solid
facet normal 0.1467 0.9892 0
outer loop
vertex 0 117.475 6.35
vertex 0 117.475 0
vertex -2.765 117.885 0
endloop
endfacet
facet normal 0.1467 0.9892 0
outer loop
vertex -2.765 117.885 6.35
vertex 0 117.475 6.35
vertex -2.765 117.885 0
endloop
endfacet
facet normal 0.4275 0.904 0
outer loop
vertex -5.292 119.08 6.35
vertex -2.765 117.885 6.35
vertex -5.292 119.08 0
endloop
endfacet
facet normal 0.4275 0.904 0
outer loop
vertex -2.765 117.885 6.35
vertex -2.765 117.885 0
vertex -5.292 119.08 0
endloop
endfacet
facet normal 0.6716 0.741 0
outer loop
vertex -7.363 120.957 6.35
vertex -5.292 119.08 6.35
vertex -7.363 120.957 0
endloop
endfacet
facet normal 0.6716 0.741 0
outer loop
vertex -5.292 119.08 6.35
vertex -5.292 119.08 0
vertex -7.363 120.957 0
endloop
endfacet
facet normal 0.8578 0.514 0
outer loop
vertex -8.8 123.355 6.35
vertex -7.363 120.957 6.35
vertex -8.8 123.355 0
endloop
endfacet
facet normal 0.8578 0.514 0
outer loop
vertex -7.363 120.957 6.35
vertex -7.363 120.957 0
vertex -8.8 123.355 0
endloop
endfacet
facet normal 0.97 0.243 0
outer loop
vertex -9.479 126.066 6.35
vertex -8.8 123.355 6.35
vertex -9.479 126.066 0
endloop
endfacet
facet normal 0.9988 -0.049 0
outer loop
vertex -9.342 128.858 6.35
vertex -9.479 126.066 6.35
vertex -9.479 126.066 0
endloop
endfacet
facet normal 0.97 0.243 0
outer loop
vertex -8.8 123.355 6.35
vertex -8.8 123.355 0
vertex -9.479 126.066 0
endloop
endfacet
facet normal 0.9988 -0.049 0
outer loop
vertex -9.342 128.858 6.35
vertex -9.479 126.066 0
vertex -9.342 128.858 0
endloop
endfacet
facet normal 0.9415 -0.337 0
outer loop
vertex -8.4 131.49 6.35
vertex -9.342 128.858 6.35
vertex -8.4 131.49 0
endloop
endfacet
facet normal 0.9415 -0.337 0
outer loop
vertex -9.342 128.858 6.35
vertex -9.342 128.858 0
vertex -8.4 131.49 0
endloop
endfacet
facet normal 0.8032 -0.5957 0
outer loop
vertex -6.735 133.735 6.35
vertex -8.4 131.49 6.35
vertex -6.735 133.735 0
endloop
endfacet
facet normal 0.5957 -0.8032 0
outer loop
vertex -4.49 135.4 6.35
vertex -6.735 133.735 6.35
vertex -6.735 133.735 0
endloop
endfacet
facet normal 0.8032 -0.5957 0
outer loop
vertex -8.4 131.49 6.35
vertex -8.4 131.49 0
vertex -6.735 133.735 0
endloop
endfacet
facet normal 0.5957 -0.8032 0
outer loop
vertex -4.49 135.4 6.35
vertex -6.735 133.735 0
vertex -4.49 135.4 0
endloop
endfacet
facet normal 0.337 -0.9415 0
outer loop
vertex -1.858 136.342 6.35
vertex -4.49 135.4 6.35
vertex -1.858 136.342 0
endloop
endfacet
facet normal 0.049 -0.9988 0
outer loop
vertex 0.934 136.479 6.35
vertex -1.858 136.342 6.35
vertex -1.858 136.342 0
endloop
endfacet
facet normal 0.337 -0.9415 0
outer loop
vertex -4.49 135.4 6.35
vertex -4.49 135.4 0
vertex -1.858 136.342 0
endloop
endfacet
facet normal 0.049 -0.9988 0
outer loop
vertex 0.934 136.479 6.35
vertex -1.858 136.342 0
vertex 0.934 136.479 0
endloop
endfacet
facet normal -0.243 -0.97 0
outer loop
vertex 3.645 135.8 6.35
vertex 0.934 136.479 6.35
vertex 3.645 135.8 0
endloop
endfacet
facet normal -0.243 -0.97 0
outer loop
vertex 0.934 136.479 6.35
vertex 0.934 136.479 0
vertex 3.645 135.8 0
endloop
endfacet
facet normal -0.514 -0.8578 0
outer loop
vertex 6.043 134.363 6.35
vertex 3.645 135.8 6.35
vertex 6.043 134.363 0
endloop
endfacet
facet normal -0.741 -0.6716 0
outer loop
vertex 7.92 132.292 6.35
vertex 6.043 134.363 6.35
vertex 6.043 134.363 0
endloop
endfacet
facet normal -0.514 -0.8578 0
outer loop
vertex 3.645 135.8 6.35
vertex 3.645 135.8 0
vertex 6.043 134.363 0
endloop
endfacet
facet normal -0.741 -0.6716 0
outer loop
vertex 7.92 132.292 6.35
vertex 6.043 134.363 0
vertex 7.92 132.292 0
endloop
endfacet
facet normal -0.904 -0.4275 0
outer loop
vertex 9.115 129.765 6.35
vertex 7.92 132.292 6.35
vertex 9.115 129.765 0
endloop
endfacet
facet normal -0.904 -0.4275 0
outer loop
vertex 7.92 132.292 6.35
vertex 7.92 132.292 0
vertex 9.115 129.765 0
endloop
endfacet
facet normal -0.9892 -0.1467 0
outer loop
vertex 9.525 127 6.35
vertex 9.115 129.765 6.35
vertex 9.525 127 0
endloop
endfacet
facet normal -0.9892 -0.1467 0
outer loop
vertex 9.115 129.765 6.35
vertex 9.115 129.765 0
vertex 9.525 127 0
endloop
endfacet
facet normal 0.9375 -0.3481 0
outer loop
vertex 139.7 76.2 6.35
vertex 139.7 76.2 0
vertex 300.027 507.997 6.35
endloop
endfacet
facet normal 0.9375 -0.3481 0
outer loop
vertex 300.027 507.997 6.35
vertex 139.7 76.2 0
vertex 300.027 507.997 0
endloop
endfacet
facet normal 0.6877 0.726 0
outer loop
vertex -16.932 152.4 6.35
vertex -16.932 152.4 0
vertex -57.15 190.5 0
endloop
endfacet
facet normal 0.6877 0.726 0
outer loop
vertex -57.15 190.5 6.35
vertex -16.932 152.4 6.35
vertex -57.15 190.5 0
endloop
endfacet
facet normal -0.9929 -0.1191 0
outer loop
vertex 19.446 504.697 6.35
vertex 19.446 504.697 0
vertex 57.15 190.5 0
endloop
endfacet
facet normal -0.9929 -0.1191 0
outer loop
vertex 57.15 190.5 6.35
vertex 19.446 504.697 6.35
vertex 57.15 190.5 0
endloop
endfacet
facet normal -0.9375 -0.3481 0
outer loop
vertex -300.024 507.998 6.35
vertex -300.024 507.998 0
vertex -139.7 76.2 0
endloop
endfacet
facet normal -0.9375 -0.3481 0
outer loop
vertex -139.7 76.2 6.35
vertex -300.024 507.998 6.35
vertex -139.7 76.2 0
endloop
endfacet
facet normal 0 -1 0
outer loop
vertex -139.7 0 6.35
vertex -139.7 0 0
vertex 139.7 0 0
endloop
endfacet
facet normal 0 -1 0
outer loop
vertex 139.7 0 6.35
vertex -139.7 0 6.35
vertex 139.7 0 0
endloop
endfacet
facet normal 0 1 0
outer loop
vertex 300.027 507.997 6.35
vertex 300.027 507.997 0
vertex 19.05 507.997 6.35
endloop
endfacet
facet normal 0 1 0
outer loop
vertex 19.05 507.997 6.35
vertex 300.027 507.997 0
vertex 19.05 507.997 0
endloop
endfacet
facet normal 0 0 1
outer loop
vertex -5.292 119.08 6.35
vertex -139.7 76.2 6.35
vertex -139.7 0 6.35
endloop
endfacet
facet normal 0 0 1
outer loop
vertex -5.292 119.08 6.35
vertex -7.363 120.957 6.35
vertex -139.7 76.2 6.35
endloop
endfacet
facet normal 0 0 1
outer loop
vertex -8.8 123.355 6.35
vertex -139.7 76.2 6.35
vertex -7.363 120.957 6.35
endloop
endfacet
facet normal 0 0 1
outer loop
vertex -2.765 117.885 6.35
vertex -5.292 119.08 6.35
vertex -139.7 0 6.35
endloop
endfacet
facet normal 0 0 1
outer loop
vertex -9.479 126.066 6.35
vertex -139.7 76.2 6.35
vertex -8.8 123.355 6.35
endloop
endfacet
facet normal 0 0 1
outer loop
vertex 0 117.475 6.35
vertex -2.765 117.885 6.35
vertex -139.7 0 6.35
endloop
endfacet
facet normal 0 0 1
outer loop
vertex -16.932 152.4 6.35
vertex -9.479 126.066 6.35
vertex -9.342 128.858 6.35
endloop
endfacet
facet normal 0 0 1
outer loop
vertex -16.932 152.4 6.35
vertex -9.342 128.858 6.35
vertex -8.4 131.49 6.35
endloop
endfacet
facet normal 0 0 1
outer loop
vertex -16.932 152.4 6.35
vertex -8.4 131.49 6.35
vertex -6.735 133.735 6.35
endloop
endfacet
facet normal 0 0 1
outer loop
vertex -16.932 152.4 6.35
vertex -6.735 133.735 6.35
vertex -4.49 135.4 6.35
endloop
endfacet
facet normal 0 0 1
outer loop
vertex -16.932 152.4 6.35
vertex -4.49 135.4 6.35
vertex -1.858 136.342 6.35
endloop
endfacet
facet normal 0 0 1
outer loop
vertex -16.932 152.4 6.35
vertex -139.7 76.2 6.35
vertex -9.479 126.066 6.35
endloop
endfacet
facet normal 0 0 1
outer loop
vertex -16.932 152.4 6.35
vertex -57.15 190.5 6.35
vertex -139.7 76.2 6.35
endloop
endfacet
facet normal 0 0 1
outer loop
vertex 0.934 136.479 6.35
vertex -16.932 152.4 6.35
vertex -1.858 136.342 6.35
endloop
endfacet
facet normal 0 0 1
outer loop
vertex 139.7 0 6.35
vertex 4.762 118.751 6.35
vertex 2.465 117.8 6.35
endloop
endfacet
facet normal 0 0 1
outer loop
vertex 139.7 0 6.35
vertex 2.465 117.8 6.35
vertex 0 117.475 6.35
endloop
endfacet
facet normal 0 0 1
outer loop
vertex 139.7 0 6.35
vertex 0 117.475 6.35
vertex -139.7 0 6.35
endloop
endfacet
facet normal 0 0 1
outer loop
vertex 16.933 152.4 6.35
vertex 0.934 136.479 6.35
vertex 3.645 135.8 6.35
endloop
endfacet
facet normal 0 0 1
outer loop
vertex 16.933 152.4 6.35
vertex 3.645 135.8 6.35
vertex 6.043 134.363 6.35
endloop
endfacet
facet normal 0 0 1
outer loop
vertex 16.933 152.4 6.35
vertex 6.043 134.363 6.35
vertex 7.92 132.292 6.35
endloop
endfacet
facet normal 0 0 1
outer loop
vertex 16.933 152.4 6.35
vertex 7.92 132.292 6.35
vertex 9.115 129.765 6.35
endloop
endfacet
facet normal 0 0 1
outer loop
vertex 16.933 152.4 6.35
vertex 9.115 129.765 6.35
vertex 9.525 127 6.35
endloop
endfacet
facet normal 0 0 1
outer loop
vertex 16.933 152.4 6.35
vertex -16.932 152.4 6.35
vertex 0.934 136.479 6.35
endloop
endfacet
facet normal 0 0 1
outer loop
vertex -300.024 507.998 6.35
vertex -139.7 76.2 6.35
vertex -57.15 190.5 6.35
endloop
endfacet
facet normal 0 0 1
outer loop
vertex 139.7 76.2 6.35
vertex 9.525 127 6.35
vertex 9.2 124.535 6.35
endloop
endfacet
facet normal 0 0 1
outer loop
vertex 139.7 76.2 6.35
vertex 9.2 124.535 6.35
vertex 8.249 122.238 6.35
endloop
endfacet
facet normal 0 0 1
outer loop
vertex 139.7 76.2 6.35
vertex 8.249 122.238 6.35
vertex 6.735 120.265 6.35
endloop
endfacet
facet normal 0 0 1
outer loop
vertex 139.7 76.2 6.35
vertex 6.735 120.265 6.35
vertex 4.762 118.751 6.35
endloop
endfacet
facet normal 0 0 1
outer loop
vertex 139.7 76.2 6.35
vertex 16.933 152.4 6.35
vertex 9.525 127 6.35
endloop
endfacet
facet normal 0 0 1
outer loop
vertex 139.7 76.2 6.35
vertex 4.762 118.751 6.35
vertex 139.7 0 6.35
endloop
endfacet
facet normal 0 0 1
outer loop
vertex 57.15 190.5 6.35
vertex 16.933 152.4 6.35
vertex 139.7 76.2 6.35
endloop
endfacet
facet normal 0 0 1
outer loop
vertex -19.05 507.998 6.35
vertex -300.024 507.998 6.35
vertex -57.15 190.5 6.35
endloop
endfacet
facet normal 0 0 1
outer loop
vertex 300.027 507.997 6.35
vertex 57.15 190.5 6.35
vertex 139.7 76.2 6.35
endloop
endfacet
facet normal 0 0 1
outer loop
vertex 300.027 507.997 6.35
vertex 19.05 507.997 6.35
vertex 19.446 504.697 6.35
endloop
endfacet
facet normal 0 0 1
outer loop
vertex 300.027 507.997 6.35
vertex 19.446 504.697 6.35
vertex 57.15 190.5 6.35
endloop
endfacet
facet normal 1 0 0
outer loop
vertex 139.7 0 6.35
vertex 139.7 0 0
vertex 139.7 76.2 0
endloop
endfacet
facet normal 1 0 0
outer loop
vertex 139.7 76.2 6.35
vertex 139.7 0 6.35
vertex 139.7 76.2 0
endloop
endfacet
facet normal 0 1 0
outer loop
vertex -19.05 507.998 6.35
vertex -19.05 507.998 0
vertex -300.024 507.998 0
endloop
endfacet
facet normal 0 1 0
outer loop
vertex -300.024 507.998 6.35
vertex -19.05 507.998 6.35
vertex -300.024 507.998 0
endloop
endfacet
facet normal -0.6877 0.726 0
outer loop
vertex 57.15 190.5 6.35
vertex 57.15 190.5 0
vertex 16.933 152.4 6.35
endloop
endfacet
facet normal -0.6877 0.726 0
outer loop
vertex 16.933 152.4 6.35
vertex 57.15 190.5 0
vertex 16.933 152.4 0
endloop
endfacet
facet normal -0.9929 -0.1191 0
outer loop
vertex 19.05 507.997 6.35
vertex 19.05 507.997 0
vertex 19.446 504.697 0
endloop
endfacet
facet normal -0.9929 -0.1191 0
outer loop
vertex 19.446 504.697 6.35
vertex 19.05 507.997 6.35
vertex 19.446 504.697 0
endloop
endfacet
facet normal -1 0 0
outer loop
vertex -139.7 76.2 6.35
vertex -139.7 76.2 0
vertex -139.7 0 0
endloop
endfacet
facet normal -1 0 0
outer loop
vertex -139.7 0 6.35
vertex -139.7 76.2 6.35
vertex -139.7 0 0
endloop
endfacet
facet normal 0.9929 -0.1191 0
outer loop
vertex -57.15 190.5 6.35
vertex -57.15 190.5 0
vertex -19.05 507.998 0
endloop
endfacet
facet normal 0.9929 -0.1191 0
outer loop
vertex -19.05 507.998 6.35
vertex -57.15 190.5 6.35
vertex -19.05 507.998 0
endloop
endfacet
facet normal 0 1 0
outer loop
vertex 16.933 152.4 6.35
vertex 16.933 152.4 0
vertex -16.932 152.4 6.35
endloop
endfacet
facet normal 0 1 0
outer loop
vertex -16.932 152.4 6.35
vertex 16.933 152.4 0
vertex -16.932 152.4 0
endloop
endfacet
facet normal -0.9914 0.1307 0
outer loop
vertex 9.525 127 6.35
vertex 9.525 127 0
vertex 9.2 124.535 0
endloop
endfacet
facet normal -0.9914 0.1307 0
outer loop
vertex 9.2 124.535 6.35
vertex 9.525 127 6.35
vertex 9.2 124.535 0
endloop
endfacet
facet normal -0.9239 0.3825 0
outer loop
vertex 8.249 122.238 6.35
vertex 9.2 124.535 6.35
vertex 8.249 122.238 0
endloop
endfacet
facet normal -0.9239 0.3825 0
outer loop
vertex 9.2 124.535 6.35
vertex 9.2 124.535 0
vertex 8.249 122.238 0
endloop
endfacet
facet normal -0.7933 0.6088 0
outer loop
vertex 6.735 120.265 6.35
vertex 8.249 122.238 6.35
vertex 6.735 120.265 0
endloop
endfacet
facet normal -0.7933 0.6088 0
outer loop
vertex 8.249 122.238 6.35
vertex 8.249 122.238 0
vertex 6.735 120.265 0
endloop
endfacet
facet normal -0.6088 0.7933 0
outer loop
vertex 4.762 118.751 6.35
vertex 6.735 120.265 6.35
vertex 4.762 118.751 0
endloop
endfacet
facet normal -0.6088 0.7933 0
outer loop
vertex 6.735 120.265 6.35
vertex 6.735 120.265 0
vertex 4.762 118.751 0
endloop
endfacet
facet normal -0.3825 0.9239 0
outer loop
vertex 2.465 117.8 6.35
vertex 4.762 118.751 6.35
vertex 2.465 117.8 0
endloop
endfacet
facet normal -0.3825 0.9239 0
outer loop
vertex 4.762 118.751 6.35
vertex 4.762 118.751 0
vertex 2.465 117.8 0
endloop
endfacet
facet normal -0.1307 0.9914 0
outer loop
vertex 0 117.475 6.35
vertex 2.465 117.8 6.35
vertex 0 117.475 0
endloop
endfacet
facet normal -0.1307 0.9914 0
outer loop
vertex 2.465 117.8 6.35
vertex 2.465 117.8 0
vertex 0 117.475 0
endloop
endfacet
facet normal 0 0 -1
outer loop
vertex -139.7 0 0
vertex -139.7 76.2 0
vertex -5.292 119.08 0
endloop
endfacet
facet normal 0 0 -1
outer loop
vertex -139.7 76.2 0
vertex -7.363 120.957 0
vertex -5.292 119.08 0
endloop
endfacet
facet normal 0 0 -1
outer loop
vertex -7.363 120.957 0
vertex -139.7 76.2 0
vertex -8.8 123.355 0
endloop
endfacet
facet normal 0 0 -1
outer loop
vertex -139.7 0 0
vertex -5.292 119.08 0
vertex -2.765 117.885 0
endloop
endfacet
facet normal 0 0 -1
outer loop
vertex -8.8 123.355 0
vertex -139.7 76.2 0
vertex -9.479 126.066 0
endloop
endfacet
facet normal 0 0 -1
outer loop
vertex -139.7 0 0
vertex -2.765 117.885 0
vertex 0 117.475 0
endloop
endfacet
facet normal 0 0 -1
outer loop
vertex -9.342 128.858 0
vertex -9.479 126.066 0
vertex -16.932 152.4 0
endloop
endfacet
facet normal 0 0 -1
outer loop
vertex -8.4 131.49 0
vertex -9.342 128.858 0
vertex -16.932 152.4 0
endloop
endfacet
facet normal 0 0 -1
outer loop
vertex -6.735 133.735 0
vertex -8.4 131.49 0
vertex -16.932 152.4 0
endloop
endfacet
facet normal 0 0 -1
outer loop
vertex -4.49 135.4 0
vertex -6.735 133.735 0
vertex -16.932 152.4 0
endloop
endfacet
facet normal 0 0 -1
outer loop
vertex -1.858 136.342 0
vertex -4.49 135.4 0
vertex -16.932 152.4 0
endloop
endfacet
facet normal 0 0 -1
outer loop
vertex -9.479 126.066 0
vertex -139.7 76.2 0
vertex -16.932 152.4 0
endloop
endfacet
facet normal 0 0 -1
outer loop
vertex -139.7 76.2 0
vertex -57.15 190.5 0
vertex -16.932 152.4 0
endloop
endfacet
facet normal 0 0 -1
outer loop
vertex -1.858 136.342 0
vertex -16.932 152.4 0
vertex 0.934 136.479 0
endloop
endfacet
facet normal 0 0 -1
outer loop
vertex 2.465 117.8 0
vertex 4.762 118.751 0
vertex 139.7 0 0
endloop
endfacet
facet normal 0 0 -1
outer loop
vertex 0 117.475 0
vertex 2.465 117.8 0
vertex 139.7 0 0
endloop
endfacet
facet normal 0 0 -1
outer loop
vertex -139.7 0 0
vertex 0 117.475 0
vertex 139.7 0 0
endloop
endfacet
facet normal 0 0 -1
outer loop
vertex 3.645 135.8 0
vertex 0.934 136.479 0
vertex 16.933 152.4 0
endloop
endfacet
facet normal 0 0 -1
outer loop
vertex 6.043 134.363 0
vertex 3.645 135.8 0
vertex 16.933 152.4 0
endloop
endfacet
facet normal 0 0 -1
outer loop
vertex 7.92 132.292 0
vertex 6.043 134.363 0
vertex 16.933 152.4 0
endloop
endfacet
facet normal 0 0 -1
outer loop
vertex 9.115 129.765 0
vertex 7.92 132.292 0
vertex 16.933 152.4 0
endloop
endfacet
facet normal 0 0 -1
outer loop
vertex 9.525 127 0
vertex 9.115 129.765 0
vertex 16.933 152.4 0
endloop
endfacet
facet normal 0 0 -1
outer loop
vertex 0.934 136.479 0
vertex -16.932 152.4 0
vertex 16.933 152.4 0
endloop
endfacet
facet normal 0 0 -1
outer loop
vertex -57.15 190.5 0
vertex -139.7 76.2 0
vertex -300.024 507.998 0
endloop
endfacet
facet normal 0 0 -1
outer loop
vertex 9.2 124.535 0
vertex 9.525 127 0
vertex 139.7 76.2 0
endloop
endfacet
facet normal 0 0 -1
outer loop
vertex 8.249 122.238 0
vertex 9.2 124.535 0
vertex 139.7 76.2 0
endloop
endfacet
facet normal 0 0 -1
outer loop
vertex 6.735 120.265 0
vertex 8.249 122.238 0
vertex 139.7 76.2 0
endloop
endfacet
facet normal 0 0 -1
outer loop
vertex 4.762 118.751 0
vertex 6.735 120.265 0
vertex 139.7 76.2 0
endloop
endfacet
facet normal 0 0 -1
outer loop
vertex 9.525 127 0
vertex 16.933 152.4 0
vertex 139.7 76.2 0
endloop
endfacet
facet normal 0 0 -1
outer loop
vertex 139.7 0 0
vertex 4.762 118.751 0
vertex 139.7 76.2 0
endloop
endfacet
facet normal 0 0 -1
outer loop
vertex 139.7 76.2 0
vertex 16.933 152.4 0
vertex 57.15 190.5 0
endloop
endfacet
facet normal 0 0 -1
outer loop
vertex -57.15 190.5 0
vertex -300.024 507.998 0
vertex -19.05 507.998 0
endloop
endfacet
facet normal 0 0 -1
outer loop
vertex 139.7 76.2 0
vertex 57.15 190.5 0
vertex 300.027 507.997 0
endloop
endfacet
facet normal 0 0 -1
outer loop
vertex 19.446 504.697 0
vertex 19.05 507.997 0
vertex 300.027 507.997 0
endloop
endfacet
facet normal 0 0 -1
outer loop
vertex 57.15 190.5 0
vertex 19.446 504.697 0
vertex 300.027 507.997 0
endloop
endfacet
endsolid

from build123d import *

# Parameters (mm, degrees)
F1_DEPTH = 6.35


with BuildPart() as f1:
    # F0 (on Top) → F1 (new body)
    with BuildSketch(Plane.XY):
        Polygon((-139.7, 0), (0, 0), (139.7, 0), (139.7, 76.2), (300.026565, 507.997021), (19.052757, 507.997021), (19.05, 507.997021), (19.446046, 504.696671), (57.15, 190.5), (16.933333, 152.4), (0, 152.4), (-16.932315, 152.4), (-57.15, 190.5), (-19.05, 507.998044), (-300.023808, 507.998044), (-139.7, 76.2), align=None)
        with BuildLine():
            ThreePointArc((9.525, 127), (6.735192, 120.264808), (0, 117.475))
            ThreePointArc((0, 117.475), (-6.735192, 133.735192), (9.525, 127))
        make_face(mode=Mode.SUBTRACT)
    extrude(amount=F1_DEPTH)


solid = f1.part
